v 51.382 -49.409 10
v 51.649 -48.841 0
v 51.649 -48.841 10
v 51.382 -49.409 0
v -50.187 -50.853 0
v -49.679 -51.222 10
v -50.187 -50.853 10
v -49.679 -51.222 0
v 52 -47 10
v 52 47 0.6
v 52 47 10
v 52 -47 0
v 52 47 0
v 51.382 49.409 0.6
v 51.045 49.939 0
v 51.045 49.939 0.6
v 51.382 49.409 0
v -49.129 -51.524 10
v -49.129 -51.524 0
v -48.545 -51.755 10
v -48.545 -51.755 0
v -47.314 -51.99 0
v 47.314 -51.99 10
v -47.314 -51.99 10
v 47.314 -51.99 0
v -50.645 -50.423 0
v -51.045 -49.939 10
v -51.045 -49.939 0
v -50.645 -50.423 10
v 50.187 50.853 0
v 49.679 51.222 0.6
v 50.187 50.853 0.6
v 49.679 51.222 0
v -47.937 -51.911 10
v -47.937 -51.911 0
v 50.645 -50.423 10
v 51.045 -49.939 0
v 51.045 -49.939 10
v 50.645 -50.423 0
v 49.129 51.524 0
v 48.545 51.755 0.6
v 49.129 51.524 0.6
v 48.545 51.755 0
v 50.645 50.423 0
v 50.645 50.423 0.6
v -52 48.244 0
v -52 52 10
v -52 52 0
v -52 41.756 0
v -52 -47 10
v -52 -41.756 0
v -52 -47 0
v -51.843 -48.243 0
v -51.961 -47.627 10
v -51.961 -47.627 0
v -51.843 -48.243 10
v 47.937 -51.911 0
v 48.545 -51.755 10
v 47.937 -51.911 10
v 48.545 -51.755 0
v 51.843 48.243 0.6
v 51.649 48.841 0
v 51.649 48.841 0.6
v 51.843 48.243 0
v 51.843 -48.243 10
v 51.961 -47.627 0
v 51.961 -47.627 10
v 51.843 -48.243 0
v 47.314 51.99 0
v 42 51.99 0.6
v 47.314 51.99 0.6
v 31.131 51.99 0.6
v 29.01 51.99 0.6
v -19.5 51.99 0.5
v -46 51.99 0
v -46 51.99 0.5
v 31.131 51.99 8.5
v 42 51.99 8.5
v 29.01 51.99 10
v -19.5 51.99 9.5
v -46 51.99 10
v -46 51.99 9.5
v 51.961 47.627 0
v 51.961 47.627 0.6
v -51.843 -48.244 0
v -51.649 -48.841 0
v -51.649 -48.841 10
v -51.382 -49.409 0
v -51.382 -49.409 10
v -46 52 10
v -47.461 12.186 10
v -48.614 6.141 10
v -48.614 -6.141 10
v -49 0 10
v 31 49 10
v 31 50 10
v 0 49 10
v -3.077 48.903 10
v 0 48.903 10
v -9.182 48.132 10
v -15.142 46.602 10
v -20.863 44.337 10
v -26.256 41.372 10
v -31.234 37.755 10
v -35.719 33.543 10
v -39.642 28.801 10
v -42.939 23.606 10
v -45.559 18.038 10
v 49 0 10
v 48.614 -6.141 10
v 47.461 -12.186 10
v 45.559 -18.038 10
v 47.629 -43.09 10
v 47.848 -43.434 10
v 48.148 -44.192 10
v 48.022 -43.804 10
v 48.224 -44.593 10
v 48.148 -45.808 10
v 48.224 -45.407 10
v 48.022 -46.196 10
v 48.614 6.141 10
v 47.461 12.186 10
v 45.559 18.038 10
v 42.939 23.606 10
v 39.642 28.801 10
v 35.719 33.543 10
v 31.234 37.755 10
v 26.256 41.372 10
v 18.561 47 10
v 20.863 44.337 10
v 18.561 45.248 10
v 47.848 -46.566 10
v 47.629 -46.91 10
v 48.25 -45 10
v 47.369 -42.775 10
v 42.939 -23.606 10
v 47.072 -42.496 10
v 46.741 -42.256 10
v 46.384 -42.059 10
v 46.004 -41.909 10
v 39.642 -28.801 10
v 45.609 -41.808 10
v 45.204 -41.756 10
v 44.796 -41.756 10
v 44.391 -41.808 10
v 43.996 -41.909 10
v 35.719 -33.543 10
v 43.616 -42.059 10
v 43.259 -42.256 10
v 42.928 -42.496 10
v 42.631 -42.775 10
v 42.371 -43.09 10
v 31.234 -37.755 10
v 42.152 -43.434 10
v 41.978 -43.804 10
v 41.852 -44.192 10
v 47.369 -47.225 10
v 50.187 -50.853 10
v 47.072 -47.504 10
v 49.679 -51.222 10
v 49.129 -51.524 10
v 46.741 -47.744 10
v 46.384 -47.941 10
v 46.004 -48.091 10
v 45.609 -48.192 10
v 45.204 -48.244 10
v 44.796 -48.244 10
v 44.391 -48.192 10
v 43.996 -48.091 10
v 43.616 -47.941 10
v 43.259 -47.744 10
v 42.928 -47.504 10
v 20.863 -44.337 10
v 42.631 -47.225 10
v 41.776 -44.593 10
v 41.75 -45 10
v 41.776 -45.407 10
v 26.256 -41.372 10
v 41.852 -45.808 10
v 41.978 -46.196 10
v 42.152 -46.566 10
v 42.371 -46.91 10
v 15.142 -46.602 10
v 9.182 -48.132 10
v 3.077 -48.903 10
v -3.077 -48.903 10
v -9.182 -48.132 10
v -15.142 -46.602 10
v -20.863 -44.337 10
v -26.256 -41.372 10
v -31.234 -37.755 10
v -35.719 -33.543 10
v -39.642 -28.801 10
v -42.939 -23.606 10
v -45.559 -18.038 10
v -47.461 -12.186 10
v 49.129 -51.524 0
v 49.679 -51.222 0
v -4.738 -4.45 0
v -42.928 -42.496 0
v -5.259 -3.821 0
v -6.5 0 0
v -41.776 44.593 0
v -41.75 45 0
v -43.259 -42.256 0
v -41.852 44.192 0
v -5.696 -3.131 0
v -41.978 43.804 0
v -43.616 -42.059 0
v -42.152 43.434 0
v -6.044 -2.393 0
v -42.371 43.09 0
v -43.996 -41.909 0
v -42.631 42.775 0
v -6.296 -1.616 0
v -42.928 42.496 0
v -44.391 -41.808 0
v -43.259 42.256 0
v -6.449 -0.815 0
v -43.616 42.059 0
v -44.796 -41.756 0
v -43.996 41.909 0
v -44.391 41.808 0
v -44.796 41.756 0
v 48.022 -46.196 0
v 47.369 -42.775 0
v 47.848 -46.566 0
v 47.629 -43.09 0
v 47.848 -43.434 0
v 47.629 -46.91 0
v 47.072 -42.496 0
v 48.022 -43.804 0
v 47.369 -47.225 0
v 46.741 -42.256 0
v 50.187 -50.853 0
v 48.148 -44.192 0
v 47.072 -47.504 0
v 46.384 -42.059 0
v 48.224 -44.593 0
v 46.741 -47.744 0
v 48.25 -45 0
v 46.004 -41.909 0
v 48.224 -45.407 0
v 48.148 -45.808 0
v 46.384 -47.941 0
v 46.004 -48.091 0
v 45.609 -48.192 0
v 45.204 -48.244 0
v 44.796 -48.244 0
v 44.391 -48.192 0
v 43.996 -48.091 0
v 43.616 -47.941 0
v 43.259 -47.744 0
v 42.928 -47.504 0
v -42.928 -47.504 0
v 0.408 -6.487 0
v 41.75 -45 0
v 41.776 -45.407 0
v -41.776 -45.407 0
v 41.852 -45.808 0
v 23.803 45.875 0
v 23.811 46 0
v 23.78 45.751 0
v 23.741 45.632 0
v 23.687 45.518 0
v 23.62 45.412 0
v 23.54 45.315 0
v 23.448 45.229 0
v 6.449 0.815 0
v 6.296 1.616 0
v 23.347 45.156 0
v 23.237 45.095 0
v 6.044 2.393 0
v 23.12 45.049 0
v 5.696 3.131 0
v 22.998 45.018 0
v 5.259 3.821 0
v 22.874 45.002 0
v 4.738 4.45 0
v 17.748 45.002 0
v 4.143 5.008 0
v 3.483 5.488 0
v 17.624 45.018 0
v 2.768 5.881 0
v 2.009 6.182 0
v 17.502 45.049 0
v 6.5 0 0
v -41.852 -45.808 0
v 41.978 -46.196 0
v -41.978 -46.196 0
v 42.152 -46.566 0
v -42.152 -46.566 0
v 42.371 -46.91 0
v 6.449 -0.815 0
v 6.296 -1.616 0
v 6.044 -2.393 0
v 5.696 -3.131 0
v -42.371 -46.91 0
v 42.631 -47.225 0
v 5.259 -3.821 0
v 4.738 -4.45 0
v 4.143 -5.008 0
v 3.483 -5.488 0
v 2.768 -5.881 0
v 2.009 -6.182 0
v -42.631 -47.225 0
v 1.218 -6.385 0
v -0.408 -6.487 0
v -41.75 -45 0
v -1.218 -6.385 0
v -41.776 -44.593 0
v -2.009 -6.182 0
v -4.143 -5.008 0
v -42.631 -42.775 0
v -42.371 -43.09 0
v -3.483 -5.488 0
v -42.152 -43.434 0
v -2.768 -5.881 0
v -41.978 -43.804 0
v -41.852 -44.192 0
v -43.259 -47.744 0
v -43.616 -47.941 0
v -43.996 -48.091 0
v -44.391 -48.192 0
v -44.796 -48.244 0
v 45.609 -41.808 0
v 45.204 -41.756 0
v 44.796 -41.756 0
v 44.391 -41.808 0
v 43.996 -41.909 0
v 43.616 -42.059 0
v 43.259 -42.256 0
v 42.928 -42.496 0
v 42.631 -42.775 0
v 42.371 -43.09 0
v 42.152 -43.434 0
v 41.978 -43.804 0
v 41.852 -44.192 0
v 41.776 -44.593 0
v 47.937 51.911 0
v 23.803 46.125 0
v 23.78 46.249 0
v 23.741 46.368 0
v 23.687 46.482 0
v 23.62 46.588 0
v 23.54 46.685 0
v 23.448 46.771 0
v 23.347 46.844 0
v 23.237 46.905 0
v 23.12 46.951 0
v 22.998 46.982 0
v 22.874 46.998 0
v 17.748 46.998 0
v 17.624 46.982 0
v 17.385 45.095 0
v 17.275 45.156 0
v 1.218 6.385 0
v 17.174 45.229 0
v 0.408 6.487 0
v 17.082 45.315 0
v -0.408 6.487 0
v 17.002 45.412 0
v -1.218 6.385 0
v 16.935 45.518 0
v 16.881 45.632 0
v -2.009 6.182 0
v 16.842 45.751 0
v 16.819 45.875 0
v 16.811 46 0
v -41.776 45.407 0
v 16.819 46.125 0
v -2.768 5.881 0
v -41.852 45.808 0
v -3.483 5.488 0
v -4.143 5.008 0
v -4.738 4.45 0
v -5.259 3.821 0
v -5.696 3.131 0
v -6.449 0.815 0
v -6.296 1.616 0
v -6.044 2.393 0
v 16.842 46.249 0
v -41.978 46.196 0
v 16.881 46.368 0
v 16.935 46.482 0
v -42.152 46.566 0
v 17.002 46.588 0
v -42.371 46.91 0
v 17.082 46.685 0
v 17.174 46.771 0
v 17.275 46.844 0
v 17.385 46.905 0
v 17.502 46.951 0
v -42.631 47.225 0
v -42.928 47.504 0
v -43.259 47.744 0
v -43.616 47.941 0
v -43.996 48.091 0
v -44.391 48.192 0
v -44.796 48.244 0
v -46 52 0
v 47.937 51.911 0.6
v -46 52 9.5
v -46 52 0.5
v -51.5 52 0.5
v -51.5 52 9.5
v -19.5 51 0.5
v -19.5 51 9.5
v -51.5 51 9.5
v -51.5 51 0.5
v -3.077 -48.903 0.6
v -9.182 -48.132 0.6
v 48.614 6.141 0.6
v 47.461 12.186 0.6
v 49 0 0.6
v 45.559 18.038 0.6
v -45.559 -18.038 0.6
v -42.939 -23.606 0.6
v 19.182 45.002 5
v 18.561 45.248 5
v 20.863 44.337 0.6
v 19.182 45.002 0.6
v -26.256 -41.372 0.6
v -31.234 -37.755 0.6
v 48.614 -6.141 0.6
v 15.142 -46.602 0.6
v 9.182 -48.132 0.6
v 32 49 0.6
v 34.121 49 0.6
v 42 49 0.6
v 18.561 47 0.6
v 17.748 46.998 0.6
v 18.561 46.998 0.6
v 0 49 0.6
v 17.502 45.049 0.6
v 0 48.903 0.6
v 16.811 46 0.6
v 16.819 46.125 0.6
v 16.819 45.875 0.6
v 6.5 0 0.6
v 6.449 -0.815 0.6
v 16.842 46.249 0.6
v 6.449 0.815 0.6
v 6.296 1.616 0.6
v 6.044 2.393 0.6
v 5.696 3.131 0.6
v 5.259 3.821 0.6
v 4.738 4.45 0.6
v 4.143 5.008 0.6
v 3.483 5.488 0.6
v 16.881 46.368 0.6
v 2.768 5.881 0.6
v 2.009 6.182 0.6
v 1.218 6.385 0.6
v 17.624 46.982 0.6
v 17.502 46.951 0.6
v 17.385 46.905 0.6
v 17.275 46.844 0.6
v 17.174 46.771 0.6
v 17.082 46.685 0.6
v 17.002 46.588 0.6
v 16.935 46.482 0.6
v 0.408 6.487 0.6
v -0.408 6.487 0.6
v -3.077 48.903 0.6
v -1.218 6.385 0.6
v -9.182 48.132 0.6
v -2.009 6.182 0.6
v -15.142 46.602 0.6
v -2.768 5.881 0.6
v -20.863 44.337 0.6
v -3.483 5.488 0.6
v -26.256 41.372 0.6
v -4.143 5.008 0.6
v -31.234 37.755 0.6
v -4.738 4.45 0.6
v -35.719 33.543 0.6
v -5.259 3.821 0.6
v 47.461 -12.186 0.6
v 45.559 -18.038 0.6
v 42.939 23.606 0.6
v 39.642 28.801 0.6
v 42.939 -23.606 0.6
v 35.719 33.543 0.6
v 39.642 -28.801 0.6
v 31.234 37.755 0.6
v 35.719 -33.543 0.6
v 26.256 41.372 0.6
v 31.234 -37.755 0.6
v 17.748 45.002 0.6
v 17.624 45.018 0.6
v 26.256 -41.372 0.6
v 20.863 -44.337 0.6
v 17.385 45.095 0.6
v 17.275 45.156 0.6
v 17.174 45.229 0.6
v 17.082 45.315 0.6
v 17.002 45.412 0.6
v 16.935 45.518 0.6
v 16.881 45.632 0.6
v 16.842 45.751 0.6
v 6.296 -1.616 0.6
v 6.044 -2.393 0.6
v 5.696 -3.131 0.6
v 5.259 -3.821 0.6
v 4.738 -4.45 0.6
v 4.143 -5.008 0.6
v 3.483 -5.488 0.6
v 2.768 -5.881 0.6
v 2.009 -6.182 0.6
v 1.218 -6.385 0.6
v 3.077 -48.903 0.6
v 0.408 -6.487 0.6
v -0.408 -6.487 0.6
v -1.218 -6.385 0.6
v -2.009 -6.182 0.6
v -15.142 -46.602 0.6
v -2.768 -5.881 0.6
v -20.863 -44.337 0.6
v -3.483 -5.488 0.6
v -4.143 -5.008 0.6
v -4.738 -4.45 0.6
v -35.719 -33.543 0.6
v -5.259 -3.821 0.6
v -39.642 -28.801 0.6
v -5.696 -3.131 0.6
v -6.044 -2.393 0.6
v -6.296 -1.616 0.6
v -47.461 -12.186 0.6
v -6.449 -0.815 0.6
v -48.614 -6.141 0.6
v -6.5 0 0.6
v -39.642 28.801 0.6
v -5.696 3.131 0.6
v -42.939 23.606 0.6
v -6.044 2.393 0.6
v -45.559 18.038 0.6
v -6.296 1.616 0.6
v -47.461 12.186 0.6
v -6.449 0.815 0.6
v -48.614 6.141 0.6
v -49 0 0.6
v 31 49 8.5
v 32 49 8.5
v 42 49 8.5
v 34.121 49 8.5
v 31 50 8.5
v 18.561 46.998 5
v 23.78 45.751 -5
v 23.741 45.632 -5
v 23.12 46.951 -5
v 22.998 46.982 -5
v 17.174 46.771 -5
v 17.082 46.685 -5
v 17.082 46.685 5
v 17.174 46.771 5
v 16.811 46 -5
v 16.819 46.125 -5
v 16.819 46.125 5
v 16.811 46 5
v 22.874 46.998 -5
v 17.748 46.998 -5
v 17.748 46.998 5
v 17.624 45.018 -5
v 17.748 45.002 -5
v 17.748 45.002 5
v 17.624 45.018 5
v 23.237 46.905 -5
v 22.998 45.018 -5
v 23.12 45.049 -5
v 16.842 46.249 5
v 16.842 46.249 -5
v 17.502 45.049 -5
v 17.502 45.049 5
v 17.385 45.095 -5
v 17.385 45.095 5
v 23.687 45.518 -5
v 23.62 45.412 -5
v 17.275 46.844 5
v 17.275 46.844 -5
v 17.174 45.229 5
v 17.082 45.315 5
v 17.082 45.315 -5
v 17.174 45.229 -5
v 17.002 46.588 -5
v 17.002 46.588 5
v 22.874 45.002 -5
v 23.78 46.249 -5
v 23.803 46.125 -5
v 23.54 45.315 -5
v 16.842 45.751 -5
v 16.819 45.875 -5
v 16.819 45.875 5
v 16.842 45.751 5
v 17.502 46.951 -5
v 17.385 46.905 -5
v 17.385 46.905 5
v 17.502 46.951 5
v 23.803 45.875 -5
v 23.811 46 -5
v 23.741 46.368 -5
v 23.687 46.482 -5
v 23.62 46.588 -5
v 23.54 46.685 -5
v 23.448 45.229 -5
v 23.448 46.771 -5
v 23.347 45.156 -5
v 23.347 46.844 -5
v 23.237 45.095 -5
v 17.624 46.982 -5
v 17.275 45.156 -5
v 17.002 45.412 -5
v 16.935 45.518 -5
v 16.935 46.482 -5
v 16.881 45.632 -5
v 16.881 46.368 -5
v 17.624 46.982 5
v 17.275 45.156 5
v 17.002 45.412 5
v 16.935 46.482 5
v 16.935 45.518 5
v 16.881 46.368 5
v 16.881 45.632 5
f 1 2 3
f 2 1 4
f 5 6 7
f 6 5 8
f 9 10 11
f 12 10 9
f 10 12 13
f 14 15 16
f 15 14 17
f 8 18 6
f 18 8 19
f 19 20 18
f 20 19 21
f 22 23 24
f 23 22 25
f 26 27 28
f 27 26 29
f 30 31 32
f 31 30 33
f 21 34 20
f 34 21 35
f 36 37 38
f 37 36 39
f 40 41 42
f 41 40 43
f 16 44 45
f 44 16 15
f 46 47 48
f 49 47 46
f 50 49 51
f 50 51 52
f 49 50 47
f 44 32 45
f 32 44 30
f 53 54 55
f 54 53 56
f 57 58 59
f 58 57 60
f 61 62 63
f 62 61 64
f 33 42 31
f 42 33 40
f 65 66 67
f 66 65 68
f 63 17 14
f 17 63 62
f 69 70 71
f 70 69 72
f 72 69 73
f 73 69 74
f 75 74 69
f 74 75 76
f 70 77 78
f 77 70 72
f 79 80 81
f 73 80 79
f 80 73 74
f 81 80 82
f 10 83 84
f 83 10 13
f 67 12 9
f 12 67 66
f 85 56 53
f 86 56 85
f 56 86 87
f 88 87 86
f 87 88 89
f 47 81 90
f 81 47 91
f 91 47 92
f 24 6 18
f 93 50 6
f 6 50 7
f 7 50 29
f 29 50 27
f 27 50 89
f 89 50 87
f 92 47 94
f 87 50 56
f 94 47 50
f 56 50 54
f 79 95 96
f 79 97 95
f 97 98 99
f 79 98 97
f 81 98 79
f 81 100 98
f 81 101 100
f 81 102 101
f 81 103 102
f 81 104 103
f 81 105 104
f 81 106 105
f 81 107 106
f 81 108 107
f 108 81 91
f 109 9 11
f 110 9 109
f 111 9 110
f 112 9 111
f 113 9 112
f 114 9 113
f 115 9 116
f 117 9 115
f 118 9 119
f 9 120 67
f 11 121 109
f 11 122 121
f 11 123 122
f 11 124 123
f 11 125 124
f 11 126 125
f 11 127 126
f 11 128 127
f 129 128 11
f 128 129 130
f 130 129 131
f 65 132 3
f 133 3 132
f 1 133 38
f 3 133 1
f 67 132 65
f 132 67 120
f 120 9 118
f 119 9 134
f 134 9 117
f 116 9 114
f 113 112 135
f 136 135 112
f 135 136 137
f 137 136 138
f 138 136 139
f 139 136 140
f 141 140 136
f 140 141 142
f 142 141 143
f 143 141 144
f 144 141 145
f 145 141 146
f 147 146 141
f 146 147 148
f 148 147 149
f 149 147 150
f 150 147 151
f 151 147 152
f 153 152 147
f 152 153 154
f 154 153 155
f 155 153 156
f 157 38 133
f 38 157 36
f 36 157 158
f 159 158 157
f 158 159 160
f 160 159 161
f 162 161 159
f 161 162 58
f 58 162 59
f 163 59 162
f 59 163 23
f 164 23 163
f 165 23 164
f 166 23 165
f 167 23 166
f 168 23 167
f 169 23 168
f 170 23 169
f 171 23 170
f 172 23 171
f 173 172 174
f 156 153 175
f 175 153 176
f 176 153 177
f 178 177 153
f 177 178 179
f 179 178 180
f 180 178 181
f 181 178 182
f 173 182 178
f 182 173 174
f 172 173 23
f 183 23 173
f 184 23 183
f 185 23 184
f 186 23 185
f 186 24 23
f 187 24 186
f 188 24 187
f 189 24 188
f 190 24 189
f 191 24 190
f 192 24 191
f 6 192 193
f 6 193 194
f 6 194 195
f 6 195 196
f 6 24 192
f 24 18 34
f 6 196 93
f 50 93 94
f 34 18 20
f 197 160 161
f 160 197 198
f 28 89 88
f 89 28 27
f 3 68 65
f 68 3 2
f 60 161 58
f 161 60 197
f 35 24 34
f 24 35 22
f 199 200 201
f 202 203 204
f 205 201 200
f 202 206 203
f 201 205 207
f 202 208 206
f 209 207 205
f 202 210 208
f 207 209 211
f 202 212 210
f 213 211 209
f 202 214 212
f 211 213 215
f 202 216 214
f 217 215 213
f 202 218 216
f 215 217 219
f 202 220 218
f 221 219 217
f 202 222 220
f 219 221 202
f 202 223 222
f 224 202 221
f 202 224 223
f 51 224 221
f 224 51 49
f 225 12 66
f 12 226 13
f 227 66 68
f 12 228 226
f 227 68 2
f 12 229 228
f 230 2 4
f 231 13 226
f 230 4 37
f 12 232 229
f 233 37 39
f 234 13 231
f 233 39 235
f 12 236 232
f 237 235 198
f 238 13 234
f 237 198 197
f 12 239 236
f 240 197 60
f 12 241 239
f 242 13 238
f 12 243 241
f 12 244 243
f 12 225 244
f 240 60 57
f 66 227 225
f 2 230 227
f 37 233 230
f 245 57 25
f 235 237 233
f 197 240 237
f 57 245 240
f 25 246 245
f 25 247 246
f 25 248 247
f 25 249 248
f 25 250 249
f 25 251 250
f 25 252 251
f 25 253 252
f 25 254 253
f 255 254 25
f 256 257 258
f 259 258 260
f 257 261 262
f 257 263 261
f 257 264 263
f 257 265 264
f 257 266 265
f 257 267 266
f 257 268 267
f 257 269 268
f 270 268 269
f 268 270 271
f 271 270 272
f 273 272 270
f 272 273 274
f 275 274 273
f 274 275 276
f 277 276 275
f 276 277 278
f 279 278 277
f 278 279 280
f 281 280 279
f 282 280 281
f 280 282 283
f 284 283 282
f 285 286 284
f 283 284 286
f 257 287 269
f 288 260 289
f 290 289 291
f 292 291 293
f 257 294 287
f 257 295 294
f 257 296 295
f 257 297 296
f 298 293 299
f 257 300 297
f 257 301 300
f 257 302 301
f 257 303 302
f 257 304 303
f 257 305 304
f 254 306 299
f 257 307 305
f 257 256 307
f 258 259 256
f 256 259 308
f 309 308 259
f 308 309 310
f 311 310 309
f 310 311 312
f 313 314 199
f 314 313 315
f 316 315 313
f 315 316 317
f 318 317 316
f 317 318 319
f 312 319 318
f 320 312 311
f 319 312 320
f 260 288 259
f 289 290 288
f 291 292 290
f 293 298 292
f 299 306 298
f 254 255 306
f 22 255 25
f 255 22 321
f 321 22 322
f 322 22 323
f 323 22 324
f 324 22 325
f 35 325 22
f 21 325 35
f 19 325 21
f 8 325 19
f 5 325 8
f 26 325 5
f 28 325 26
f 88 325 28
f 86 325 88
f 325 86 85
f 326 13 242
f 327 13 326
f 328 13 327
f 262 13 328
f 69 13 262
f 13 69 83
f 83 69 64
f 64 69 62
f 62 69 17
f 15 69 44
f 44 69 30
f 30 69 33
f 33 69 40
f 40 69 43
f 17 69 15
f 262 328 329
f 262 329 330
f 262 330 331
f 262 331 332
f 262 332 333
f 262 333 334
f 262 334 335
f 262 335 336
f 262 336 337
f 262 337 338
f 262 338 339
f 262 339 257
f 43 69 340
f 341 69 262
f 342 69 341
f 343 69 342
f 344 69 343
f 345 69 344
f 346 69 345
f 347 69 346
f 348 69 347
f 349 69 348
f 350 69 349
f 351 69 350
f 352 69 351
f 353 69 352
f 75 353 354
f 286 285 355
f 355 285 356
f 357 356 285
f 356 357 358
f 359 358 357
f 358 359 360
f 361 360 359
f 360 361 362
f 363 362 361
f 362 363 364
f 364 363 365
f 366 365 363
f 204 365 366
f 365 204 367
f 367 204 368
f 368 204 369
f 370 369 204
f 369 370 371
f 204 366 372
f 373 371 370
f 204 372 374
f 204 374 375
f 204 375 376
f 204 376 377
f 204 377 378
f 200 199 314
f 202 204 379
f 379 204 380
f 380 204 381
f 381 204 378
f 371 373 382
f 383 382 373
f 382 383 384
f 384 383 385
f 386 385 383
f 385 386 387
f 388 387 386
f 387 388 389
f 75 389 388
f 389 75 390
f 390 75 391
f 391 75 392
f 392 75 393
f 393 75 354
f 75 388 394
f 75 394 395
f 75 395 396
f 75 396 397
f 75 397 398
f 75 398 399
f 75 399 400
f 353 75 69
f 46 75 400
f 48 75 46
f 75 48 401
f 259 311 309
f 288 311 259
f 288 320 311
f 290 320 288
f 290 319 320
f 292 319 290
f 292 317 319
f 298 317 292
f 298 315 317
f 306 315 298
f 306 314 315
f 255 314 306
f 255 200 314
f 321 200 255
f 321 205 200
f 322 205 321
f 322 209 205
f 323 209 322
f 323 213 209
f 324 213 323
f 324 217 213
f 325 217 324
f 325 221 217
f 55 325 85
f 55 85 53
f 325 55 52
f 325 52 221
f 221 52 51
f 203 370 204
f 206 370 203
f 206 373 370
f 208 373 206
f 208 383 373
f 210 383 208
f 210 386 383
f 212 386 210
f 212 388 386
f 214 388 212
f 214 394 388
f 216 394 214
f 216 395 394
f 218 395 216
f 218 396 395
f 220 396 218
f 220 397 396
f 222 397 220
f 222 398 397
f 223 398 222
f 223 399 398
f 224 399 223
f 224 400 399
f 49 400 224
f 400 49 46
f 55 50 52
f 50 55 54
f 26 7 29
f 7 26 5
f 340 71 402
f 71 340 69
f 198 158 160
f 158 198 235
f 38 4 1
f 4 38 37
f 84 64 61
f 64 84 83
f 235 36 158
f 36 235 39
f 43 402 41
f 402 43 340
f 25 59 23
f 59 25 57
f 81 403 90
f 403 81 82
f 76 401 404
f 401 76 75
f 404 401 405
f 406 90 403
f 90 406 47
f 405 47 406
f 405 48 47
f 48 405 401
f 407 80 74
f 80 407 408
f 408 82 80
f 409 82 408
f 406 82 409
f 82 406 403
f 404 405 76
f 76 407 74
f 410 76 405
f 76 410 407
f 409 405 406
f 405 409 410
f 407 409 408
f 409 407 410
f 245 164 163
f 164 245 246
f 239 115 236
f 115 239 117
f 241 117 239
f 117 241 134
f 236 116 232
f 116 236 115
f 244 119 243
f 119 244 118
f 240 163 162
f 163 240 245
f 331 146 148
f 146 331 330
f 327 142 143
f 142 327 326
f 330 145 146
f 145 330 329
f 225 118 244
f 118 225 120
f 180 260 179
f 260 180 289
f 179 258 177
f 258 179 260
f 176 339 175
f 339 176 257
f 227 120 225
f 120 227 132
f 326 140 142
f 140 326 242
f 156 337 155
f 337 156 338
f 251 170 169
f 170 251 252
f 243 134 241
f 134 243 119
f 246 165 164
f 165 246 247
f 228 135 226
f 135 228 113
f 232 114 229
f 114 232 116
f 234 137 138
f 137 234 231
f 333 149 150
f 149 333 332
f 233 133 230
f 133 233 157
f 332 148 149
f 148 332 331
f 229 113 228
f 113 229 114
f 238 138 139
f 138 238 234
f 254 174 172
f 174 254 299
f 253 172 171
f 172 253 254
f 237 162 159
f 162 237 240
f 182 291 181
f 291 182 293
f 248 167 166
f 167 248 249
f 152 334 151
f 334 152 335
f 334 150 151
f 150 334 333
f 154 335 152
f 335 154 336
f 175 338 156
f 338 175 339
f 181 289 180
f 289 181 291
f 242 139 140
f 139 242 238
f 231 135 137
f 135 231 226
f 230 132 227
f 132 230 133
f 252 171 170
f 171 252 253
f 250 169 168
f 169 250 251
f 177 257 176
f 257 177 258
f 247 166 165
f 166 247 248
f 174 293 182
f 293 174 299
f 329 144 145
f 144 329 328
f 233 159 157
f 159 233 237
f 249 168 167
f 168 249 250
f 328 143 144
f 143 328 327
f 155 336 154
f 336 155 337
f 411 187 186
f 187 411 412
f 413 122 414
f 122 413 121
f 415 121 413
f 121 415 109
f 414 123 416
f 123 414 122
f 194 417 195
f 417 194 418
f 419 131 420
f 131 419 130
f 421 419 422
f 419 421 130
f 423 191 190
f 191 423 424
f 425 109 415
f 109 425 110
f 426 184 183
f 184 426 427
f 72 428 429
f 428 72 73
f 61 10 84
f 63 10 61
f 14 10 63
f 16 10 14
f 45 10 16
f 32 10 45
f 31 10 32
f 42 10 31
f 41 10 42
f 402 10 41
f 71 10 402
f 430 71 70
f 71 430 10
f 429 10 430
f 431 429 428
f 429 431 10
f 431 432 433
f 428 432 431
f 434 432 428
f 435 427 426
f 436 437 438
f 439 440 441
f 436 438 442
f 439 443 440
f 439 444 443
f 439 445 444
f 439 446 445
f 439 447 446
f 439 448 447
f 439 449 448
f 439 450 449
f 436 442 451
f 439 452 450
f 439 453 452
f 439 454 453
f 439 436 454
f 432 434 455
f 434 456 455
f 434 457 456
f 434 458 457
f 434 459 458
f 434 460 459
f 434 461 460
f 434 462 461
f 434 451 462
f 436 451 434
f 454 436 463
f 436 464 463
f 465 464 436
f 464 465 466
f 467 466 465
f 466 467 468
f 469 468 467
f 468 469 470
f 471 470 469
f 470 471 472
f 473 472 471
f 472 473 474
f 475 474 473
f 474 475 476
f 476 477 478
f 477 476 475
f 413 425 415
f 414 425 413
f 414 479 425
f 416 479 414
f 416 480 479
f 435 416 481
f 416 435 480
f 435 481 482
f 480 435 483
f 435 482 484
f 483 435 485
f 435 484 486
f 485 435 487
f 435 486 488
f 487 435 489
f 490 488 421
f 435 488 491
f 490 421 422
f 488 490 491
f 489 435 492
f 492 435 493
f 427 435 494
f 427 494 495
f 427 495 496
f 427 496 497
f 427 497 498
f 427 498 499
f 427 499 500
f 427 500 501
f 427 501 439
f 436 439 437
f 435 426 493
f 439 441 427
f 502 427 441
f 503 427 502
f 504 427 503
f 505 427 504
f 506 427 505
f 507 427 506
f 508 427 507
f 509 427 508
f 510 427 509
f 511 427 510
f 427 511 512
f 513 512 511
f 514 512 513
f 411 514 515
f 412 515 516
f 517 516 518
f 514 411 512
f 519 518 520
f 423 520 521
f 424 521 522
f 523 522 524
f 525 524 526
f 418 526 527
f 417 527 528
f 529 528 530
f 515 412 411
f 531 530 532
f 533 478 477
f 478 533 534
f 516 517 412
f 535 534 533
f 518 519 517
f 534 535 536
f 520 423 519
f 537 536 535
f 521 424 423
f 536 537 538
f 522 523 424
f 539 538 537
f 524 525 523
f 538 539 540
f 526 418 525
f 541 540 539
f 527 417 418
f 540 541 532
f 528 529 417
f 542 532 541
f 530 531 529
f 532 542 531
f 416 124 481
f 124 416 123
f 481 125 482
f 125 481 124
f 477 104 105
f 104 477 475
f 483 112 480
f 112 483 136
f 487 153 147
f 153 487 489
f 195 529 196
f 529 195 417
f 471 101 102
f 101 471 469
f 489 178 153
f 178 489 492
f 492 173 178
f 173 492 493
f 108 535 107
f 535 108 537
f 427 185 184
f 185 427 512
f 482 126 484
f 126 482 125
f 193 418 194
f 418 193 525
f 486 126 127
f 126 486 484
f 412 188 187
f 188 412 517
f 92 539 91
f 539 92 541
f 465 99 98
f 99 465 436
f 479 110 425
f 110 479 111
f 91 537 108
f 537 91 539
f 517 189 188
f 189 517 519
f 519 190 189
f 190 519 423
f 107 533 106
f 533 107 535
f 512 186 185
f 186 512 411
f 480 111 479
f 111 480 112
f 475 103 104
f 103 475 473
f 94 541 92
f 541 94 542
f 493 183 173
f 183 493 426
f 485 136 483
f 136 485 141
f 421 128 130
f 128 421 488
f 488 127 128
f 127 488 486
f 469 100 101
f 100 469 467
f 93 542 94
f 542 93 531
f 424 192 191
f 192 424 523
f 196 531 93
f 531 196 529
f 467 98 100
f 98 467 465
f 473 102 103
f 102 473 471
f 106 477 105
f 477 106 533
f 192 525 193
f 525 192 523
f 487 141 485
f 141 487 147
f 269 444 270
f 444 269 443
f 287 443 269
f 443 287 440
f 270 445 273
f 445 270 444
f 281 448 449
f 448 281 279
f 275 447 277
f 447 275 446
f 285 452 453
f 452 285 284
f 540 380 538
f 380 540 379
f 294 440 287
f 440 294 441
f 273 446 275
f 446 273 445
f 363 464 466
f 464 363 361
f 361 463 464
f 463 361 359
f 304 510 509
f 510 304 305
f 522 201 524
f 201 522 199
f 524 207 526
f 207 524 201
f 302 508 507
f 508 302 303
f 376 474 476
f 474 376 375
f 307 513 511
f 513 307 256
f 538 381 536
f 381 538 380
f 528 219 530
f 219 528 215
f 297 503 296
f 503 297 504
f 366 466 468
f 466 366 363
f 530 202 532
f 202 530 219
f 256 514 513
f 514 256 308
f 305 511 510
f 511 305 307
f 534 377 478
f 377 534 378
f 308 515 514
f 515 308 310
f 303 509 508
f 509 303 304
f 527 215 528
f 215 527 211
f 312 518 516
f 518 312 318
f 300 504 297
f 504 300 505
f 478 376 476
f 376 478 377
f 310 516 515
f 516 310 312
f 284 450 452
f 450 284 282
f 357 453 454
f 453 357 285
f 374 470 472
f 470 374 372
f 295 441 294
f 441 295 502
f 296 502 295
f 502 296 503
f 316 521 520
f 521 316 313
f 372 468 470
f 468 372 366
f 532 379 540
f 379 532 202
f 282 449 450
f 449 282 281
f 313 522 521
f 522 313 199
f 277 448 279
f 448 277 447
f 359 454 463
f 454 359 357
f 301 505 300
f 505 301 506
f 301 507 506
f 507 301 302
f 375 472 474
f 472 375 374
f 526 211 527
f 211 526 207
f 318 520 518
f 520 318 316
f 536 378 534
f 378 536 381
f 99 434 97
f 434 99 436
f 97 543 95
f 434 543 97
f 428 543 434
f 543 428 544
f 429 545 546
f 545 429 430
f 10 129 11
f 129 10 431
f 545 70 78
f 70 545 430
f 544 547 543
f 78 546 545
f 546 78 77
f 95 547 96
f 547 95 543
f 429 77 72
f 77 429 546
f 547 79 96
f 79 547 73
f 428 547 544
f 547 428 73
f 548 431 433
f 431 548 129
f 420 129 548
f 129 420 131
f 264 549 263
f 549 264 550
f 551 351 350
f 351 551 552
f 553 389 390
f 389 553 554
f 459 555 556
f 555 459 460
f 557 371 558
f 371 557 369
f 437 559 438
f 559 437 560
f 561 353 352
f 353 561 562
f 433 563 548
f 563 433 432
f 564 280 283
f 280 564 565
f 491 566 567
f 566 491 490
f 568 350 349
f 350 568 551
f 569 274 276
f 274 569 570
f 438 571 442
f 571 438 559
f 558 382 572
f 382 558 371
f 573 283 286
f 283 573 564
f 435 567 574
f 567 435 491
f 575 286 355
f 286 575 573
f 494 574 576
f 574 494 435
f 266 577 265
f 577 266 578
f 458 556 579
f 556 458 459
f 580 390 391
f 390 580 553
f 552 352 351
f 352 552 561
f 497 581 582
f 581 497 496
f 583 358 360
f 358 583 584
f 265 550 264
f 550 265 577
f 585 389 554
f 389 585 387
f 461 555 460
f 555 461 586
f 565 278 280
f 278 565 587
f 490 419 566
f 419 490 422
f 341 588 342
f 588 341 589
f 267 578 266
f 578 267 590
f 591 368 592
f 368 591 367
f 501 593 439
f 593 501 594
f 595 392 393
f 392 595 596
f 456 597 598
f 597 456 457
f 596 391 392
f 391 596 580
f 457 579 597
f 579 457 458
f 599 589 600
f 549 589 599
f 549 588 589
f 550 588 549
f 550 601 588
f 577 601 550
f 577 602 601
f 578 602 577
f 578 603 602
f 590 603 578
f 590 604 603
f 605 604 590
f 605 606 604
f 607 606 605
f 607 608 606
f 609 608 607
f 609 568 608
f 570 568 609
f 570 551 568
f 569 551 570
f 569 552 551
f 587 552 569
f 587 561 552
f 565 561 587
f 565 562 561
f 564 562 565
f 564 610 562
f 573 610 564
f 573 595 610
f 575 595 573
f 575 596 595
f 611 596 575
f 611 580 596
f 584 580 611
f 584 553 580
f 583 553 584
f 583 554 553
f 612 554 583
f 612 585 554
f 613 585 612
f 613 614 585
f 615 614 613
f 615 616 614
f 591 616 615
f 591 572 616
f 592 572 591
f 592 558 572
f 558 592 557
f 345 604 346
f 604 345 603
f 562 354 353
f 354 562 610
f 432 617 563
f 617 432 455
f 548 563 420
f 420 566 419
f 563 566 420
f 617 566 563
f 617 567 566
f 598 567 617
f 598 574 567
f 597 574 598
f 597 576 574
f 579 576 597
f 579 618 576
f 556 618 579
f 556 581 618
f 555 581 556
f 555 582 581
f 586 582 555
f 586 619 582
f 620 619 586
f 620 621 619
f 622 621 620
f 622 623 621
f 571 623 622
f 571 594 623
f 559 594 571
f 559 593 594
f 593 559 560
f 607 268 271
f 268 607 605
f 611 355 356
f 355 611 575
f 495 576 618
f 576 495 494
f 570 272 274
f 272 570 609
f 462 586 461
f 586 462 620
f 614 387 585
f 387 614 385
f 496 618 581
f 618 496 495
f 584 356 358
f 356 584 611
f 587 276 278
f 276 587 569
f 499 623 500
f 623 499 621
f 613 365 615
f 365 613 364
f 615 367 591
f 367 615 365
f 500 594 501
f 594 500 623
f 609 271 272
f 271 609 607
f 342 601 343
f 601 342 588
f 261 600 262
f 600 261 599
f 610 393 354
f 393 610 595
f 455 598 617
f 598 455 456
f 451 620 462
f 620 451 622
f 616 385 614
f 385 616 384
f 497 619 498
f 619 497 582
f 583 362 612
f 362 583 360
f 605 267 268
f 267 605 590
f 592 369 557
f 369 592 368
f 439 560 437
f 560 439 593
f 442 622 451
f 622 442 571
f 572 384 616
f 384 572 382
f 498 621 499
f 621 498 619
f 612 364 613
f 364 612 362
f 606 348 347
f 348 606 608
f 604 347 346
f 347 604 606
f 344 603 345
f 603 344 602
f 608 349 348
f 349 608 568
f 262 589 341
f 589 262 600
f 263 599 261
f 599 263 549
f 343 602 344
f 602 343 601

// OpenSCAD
$fn = 50;


union() {
	difference() {
		union() {
			hull() {
				translate(v = [-47.0000000000, 47.0000000000, 0]) {
					cylinder(h = 10, r = 5);
				}
				translate(v = [47.0000000000, 47.0000000000, 0]) {
					cylinder(h = 10, r = 5);
				}
				translate(v = [-47.0000000000, -47.0000000000, 0]) {
					cylinder(h = 10, r = 5);
				}
				translate(v = [47.0000000000, -47.0000000000, 0]) {
					cylinder(h = 10, r = 5);
				}
			}
			translate(v = [-52.0000000000, 46.0000000000, 0]) {
				cube(size = [6, 6, 10]);
			}
		}
		union() {
			translate(v = [-52.5000000000, -45.0000000000, -250.0000000000]) {
				rotate(a = [0, 0, 0]) {
					difference() {
						union() {
							hull() {
								translate(v = [7.5000000000, 0, 0]) {
									cylinder(h = 250, r = 3.2500000000, r1 = 3.2500000000, r2 = 3.2500000000);
								}
								translate(v = [-7.5000000000, 0, 0]) {
									cylinder(h = 250, r = 3.2500000000, r1 = 3.2500000000, r2 = 3.2500000000);
								}
							}
						}
						union();
					}
				}
			}
			translate(v = [-52.5000000000, 45.0000000000, -250.0000000000]) {
				rotate(a = [0, 0, 0]) {
					difference() {
						union() {
							hull() {
								translate(v = [7.5000000000, 0, 0]) {
									cylinder(h = 250, r = 3.2500000000, r1 = 3.2500000000, r2 = 3.2500000000);
								}
								translate(v = [-7.5000000000, 0, 0]) {
									cylinder(h = 250, r = 3.2500000000, r1 = 3.2500000000, r2 = 3.2500000000);
								}
							}
						}
						union();
					}
				}
			}
			translate(v = [-51.5000000000, 51.0000000000, 0.5000000000]) {
				cube(size = [32, 1, 9.0000000000]);
			}
			translate(v = [45.0000000000, -45.0000000000, 0]) {
				cylinder(h = 100, r = 3.2500000000);
			}
			translate(v = [0, 0, 0.6000000000]) {
				cylinder(h = 12.4000000000, r = 49.0000000000);
			}
			translate(v = [0, 0, -5.0000000000]) {
				cylinder(h = 10, r = 6.5000000000);
			}
			translate(v = [0.0000000000, 47.0000000000, 0.6000000000]) {
				cube(size = [52.0000000000, 2, 12.4000000000]);
			}
			translate(v = [42.0000000000, 47.0000000000, 0.6000000000]) {
				cube(size = [10, 5, 12.4000000000]);
			}
			translate(v = [31.0000000000, 47.0000000000, 8.5000000000]) {
				cube(size = [21, 5, 1.5000000000]);
			}
			translate(v = [28.2500000000, 52.7500000000, 0.6000000000]) {
				rotate(a = [0, 0, -45]) {
					cube(size = [7.5000000000, 1.5000000000, 12.4000000000]);
				}
			}
			translate(v = [11.0610000000, 45.0000000000, 0.6000000000]) {
				cube(size = [7.5000000000, 2, 9.4000000000]);
			}
		}
	}
	union() {
		translate(v = [20.3110000000, 46.0000000000, -5.0000000000]) {
			rotate(a = [0, 0, 0]) {
				difference() {
					union() {
						#hull() {
							#translate(v = [2.5000000000, 0, 0]) {
								cylinder(h = 10, r = 1.0000000000, r1 = 1.0000000000, r2 = 1.0000000000);
							}
							#translate(v = [-2.5000000000, 0, 0]) {
								cylinder(h = 10, r = 1.0000000000, r1 = 1.0000000000, r2 = 1.0000000000);
							}
						}
					}
					union();
				}
			}
		}
	}
}
